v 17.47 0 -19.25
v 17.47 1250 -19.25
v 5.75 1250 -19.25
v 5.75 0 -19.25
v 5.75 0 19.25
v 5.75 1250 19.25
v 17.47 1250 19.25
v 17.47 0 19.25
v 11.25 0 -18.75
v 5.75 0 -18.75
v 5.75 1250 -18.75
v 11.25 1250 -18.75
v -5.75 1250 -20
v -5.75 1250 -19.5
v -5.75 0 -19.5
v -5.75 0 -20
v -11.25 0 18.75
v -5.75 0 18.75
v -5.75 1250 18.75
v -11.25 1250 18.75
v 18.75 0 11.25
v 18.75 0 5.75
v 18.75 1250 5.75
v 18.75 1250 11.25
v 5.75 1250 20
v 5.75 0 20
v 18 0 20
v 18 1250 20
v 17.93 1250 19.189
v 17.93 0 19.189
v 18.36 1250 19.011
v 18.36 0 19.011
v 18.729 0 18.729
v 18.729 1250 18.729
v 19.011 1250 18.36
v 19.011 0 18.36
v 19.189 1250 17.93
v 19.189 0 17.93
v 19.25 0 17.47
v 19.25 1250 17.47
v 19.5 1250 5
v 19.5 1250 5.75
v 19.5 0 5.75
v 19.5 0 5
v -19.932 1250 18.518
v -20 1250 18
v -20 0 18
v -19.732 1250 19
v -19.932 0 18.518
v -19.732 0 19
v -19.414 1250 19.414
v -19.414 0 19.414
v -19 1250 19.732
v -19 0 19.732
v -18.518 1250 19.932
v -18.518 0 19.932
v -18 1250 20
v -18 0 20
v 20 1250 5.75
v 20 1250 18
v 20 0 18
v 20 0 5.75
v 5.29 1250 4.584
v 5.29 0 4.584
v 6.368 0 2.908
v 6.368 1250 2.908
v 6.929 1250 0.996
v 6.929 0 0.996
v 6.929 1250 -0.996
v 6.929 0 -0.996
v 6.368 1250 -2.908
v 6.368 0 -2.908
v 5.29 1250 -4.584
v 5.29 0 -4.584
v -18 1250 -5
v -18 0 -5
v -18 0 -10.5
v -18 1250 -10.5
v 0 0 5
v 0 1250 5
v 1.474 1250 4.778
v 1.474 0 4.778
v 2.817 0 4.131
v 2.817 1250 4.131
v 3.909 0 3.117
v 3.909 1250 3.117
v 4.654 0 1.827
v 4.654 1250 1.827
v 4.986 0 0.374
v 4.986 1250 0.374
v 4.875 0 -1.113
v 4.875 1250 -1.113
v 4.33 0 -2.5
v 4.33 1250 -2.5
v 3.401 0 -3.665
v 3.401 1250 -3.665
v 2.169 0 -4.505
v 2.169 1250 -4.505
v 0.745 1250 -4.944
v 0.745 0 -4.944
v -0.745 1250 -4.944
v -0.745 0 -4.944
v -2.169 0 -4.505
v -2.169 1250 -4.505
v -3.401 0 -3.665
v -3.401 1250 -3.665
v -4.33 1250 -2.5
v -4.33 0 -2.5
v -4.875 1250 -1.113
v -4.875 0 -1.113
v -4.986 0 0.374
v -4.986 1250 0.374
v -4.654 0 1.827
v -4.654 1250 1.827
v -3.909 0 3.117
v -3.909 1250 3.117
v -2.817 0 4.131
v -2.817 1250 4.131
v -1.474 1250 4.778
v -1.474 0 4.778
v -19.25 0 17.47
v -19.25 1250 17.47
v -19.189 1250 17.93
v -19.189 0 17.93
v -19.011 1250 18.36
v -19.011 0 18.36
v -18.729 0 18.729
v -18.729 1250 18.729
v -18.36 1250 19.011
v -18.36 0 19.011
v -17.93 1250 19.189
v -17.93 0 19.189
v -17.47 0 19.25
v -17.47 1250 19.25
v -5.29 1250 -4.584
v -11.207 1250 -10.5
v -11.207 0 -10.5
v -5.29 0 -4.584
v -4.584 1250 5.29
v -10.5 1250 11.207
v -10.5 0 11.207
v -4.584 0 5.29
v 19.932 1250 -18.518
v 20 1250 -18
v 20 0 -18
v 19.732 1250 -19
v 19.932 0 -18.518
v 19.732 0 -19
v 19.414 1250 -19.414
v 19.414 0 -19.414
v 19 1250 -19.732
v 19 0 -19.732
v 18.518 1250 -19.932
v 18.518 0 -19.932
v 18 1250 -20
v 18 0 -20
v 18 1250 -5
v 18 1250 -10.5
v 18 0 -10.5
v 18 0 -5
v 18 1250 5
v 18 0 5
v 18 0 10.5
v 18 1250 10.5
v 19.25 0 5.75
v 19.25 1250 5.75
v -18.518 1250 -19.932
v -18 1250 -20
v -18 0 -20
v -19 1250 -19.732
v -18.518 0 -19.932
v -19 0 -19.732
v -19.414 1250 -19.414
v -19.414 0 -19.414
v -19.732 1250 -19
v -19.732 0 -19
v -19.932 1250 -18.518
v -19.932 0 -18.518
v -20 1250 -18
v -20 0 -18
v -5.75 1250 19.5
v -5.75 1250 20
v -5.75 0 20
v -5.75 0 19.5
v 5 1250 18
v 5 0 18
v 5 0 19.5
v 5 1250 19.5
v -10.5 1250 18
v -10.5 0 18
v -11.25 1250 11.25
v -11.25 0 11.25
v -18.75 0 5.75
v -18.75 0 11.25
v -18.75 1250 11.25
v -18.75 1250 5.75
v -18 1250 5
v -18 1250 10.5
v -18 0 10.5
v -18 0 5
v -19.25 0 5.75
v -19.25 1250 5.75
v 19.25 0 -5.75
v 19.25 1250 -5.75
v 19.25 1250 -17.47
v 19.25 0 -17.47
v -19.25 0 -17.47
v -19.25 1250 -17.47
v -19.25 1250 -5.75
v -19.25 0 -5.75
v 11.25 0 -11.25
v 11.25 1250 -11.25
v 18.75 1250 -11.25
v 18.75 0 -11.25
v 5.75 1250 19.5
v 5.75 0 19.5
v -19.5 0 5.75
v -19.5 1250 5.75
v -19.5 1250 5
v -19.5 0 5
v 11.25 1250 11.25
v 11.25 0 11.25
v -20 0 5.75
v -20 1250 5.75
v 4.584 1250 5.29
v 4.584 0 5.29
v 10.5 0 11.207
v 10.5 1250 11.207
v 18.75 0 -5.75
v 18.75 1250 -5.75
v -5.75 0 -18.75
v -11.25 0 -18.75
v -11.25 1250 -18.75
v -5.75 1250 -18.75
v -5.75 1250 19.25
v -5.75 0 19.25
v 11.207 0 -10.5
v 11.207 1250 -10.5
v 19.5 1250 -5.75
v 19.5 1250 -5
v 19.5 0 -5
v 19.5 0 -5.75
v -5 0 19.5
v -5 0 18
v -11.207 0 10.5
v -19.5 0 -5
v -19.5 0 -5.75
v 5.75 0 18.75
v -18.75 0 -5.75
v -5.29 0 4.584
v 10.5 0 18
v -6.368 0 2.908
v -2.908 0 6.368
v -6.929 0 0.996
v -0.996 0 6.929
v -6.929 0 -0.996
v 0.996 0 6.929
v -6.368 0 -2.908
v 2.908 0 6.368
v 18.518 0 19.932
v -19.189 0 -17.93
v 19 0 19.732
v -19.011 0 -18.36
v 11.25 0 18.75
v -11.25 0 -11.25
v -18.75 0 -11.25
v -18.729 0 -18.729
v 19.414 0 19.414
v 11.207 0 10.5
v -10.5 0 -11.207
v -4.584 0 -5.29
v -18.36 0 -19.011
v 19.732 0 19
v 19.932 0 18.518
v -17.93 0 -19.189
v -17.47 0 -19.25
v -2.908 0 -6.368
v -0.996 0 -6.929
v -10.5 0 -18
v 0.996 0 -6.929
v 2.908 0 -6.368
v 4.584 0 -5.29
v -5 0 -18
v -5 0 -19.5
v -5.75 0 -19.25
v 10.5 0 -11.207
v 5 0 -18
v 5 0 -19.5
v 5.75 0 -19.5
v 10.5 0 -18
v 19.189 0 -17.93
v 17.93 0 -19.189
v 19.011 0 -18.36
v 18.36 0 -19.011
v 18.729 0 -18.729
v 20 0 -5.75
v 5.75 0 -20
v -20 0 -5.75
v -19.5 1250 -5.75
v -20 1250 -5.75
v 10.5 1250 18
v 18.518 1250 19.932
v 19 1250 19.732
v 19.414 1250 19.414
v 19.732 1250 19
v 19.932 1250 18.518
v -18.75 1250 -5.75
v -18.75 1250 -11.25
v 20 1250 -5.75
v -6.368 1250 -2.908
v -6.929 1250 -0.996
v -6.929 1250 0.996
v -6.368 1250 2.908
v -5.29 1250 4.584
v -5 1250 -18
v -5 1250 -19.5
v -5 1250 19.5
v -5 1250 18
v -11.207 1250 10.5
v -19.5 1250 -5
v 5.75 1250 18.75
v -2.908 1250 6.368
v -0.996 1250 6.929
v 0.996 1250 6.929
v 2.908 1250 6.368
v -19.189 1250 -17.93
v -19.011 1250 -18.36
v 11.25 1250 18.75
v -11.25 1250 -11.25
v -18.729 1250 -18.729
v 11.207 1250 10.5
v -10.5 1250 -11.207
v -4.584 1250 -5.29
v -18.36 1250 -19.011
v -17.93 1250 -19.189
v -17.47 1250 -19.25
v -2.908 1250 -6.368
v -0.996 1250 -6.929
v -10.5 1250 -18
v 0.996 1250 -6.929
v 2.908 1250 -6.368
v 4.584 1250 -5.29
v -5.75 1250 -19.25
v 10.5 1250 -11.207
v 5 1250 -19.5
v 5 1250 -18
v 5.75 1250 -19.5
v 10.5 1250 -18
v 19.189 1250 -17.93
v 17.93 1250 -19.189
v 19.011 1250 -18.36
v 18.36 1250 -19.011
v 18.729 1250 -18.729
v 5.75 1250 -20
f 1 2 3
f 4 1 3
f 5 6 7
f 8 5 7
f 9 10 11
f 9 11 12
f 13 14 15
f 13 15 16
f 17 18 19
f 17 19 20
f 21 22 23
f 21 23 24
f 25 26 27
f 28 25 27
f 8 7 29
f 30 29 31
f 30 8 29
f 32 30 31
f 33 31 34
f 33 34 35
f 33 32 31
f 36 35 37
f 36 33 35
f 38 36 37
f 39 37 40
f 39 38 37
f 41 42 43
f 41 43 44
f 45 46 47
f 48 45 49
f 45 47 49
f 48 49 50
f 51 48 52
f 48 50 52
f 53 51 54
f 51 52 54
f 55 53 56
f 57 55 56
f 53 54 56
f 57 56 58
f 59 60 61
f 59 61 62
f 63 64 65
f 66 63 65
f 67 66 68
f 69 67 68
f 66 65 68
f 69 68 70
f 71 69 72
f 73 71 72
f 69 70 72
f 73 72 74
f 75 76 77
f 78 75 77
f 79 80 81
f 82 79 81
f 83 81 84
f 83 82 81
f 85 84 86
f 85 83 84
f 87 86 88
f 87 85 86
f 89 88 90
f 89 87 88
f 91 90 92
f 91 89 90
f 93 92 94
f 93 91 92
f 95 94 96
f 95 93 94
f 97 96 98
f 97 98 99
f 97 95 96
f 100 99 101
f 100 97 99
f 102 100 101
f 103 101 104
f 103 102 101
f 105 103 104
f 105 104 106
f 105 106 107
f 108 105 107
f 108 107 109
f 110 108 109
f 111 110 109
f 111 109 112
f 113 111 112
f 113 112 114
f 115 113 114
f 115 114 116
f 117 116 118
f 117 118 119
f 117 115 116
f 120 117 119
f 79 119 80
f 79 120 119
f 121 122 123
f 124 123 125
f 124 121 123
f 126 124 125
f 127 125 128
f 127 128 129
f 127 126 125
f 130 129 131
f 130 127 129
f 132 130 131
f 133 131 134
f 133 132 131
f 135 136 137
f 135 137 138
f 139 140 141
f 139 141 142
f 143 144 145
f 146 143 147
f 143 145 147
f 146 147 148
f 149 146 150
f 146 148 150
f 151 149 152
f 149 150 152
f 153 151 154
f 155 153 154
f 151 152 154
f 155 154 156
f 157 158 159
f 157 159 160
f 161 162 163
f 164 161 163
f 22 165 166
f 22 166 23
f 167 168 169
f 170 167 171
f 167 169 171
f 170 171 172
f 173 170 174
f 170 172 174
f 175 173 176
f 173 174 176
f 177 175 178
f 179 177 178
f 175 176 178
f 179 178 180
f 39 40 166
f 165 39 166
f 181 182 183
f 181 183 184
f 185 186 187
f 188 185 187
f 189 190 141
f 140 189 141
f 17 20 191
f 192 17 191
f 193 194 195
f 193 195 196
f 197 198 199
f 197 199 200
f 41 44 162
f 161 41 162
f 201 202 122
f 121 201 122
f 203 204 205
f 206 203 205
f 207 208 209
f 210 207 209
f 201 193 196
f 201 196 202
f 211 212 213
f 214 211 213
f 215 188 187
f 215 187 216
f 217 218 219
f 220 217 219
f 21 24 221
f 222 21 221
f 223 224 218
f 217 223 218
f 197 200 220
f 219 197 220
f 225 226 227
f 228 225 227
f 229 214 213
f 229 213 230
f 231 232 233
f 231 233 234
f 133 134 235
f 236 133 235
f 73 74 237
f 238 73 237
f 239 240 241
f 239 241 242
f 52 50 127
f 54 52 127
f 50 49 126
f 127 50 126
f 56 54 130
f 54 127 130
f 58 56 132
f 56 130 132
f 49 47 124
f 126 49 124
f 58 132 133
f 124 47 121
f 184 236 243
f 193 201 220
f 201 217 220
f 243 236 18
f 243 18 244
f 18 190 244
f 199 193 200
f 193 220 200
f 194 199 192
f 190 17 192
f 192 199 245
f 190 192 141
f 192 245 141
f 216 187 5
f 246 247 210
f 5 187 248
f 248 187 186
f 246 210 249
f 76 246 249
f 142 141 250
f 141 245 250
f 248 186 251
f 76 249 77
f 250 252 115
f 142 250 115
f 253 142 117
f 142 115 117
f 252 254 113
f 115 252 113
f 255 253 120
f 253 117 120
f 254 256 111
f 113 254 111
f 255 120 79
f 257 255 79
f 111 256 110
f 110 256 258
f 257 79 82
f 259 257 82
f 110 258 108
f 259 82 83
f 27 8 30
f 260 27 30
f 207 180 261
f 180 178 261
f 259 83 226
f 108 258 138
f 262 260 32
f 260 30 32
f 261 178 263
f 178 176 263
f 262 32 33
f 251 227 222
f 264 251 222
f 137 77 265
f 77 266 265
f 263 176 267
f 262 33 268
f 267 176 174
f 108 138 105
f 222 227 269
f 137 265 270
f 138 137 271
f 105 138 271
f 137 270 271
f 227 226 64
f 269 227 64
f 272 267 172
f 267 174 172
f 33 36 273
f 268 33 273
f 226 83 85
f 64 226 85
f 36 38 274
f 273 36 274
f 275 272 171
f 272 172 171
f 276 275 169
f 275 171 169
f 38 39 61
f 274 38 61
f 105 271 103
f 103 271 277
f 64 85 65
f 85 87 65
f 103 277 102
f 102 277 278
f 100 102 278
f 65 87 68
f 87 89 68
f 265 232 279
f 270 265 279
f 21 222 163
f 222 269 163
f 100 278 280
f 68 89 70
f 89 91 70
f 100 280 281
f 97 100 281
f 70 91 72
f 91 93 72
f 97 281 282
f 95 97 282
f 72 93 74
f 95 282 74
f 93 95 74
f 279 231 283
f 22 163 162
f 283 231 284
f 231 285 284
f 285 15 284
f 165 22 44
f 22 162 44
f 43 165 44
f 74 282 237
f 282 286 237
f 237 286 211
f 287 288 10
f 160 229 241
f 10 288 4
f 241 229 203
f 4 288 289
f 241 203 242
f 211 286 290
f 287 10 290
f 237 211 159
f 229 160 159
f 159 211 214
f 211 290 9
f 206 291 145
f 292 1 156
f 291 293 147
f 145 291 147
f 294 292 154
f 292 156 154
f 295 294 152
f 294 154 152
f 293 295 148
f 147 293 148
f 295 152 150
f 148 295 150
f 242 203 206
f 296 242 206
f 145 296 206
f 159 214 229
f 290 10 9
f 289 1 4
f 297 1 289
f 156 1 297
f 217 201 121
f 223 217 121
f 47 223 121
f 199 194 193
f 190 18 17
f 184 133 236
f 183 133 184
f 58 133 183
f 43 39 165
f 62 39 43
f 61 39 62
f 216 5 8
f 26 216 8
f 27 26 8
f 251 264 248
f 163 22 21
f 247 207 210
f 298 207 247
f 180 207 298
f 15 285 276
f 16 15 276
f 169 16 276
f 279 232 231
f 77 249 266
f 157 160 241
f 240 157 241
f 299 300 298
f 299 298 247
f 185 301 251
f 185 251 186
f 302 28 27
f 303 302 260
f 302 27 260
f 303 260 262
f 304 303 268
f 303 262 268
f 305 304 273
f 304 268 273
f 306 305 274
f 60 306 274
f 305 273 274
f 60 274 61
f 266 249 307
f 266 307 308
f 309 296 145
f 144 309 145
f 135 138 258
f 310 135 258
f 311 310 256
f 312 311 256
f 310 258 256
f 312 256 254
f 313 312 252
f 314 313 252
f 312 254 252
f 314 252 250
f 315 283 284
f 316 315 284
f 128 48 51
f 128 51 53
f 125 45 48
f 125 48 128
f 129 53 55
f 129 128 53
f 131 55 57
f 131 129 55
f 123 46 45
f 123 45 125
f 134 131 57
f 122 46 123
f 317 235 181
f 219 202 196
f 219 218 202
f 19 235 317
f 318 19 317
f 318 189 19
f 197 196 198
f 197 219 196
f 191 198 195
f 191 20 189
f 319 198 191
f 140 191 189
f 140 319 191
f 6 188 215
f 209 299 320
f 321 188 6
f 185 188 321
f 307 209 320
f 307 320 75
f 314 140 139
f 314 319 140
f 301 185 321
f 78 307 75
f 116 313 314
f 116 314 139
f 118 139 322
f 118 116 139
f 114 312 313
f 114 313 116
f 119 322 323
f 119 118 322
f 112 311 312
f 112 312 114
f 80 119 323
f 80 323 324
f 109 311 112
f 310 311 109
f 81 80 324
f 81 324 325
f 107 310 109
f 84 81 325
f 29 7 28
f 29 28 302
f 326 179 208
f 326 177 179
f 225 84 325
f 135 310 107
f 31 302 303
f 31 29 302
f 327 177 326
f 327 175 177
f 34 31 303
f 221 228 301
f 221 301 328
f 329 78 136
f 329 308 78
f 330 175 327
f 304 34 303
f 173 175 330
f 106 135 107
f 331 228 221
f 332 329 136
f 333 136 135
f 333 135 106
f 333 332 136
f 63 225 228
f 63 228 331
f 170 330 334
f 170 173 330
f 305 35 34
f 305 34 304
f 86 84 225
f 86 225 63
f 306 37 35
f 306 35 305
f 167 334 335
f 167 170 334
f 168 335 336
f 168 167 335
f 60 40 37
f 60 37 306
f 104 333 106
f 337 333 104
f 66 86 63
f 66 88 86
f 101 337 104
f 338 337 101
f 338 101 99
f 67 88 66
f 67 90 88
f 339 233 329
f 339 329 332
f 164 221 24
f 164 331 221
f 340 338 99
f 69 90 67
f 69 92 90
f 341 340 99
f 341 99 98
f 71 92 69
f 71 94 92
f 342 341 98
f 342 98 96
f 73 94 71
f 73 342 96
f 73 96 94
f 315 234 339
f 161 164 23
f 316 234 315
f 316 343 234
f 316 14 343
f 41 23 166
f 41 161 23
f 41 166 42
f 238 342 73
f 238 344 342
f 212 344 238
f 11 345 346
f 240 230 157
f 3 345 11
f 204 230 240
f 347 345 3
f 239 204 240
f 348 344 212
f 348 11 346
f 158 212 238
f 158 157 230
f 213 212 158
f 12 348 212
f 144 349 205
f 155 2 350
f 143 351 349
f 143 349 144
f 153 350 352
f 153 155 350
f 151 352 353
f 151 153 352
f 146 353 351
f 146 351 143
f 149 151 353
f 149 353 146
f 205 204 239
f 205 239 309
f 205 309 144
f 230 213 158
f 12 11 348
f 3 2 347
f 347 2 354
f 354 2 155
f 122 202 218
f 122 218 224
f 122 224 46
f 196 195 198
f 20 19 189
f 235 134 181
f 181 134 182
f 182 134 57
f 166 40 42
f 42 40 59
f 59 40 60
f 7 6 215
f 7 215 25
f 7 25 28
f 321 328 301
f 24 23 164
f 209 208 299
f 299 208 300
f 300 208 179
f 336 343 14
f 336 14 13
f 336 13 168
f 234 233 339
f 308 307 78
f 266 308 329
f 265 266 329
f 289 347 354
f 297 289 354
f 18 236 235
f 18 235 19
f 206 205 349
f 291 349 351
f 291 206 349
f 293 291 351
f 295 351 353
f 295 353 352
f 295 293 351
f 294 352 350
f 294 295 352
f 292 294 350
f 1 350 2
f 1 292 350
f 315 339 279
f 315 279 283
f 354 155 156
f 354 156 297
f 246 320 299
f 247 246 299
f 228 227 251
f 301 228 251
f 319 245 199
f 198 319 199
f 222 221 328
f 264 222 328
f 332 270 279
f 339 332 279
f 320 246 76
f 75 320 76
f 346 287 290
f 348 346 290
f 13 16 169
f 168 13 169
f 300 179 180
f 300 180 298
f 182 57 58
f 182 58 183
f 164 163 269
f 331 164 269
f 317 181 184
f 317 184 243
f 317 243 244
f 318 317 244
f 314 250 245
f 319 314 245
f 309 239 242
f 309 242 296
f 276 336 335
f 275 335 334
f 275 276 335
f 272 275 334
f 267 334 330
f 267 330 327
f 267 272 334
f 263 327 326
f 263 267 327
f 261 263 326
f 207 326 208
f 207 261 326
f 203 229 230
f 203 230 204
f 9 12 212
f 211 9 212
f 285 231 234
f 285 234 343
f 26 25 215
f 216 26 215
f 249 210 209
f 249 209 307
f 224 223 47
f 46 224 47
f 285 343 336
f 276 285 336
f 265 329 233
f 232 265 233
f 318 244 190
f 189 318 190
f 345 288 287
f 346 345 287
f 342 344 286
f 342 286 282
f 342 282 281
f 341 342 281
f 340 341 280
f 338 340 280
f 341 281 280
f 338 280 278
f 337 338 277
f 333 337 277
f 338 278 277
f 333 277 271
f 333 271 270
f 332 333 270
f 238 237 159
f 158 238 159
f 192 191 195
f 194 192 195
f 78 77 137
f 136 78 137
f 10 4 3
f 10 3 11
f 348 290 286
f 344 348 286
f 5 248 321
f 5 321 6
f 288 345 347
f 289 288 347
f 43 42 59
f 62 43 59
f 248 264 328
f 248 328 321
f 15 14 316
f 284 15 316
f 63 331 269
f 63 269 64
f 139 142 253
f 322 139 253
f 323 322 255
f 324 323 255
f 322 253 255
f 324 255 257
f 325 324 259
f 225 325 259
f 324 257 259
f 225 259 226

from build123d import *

# Parameters (mm, degrees)
ESBO_O1_R                = 5
RESSALTO_EXTRUS_O1_DEPTH = 1250
ESBO_O4_W                = 0.75
ESBO_O4_H                = 0.5
ESBO_O4_W_2              = 0.5
ESBO_O4_H_2              = 0.75
CORTE_EXTRUS_O1_DEPTH    = 1250


with BuildPart() as part:
    # Esboço1 → Ressalto-extrusão1 (new body)
    with BuildSketch(Plane(origin=(0, 0, 0), x_dir=(1, 0, 0), z_dir=(0, 1, 0))):
        with BuildLine():
            Line((-18, -20), (-5, -20))
            Line((-5, -20), (-5, -18))
            Line((-5, -18), (-10.5, -18))
            Line((-10.5, -18), (-10.5, -11.206655676))
            Line((-10.5, -11.206655676), (-4.583792723, -5.2904484))
            ThreePointArc((-4.583792723, -5.2904484), (0, -7), (4.583792723, -5.2904484))
            Line((4.583792723, -5.2904484), (10.5, -11.206655676))
            Line((10.5, -11.206655676), (10.5, -18))
            Line((10.5, -18), (5, -18))
            Line((5, -18), (5, -20))
            Line((5, -20), (18, -20))
            ThreePointArc((18, -20), (19.414213562, -19.414213562), (20, -18))
            Line((20, -18), (20, -5))
            Line((20, -5), (18, -5))
            Line((18, -5), (18, -10.5))
            Line((18, -10.5), (11.206655676, -10.5))
            Line((11.206655676, -10.5), (5.2904484, -4.583792723))
            ThreePointArc((5.2904484, -4.583792723), (7, 0), (5.2904484, 4.583792723))
            Line((5.2904484, 4.583792723), (11.206655676, 10.5))
            Line((11.206655676, 10.5), (18, 10.5))
            Line((18, 10.5), (18, 5))
            Line((18, 5), (20, 5))
            Line((20, 5), (20, 18))
            ThreePointArc((20, 18), (19.414213562, 19.414213562), (18, 20))
            Line((18, 20), (5, 20))
            Line((5, 20), (5, 18))
            Line((5, 18), (10.5, 18))
            Line((10.5, 18), (10.5, 11.206655676))
            Line((10.5, 11.206655676), (4.583792723, 5.2904484))
            ThreePointArc((4.583792723, 5.2904484), (0, 7), (-4.583792723, 5.2904484))
            Line((-4.583792723, 5.2904484), (-10.5, 11.206655676))
            Line((-10.5, 11.206655676), (-10.5, 18))
            Line((-10.5, 18), (-5, 18))
            Line((-5, 18), (-5, 20))
            Line((-5, 20), (-18, 20))
            ThreePointArc((-18, 20), (-19.414213562, 19.414213562), (-20, 18))
            Line((-20, 18), (-20, 5))
            Line((-20, 5), (-18, 5))
            Line((-18, 5), (-18, 10.5))
            Line((-18, 10.5), (-11.206655676, 10.5))
            Line((-11.206655676, 10.5), (-5.2904484, 4.583792723))
            ThreePointArc((-5.2904484, 4.583792723), (-7, 0), (-5.2904484, -4.583792723))
            Line((-5.2904484, -4.583792723), (-11.206655676, -10.5))
            Line((-11.206655676, -10.5), (-18, -10.5))
            Line((-18, -10.5), (-18, -5))
            Line((-18, -5), (-20, -5))
            Line((-20, -5), (-20, -18))
            ThreePointArc((-20, -18), (-19.414213562, -19.414213562), (-18, -20))
        make_face()
        with Locations(Location((0, 0, 0), (0, 0, 270))):
            Circle(ESBO_O1_R, mode=Mode.SUBTRACT)
        with BuildLine():
            Line((-19.25, 5.75), (-18.75, 5.75))
            Line((-18.75, 5.75), (-18.75, 11.25))
            Line((-18.75, 11.25), (-11.25, 11.25))
            Line((-11.25, 11.25), (-11.25, 18.75))
            Line((-11.25, 18.75), (-5.75, 18.75))
            Line((-5.75, 18.75), (-5.75, 19.25))
            Line((-5.75, 19.25), (-17.469669914, 19.25))
            ThreePointArc((-17.469669914, 19.25), (-18.728553391, 18.728553391), (-19.25, 17.469669914))
            Line((-19.25, 17.469669914), (-19.25, 5.75))
        make_face(mode=Mode.SUBTRACT)
        with BuildLine():
            Line((19.25, 5.75), (19.25, 17.469669914))
            ThreePointArc((19.25, 17.469669914), (18.728553391, 18.728553391), (17.469669914, 19.25))
            Line((17.469669914, 19.25), (5.75, 19.25))
            Line((5.75, 19.25), (5.75, 18.75))
            Line((5.75, 18.75), (11.25, 18.75))
            Line((11.25, 18.75), (11.25, 11.25))
            Line((11.25, 11.25), (18.75, 11.25))
            Line((18.75, 11.25), (18.75, 5.75))
            Line((18.75, 5.75), (19.25, 5.75))
        make_face(mode=Mode.SUBTRACT)
        with BuildLine():
            Line((19.25, -5.75), (18.75, -5.75))
            Line((18.75, -5.75), (18.75, -11.25))
            Line((18.75, -11.25), (11.25, -11.25))
            Line((11.25, -11.25), (11.25, -18.75))
            Line((11.25, -18.75), (5.75, -18.75))
            Line((5.75, -18.75), (5.75, -19.25))
            Line((5.75, -19.25), (17.469669914, -19.25))
            ThreePointArc((17.469669914, -19.25), (18.728553391, -18.728553391), (19.25, -17.469669914))
            Line((19.25, -17.469669914), (19.25, -5.75))
        make_face(mode=Mode.SUBTRACT)
        with BuildLine():
            Line((-19.25, -5.75), (-19.25, -17.469669914))
            ThreePointArc((-19.25, -17.469669914), (-18.728553391, -18.728553391), (-17.469669914, -19.25))
            Line((-17.469669914, -19.25), (-5.75, -19.25))
            Line((-5.75, -19.25), (-5.75, -18.75))
            Line((-5.75, -18.75), (-11.25, -18.75))
            Line((-11.25, -18.75), (-11.25, -11.25))
            Line((-11.25, -11.25), (-18.75, -11.25))
            Line((-18.75, -11.25), (-18.75, -5.75))
            Line((-18.75, -5.75), (-19.25, -5.75))
        make_face(mode=Mode.SUBTRACT)
    extrude(amount=RESSALTO_EXTRUS_O1_DEPTH)

    # Esboço4 → Corte-extrusão1 (cut)
    with BuildSketch(Plane(origin=(0, 1250, 0), x_dir=(1, 0, 0), z_dir=(0, 1, 0))):
        with Locations((-5.375, 19.75)):
            Rectangle(ESBO_O4_W, ESBO_O4_H)
        with Locations((19.75, 5.375)):
            Rectangle(ESBO_O4_W_2, ESBO_O4_H_2)
        with Locations((-19.75, 5.375)):
            Rectangle(ESBO_O4_W_2, ESBO_O4_H_2)
        with Locations((5.375, 19.75)):
            Rectangle(ESBO_O4_W, ESBO_O4_H)
        with Locations((5.375, -19.75)):
            Rectangle(ESBO_O4_W, ESBO_O4_H)
        with Locations((19.75, -5.375)):
            Rectangle(ESBO_O4_W_2, ESBO_O4_H_2)
        with Locations((-19.75, -5.375)):
            Rectangle(ESBO_O4_W_2, ESBO_O4_H_2)
        with Locations((-5.375, -19.75)):
            Rectangle(ESBO_O4_W, ESBO_O4_H)
    extrude(amount=-CORTE_EXTRUS_O1_DEPTH, mode=Mode.SUBTRACT)


solid = part.part
